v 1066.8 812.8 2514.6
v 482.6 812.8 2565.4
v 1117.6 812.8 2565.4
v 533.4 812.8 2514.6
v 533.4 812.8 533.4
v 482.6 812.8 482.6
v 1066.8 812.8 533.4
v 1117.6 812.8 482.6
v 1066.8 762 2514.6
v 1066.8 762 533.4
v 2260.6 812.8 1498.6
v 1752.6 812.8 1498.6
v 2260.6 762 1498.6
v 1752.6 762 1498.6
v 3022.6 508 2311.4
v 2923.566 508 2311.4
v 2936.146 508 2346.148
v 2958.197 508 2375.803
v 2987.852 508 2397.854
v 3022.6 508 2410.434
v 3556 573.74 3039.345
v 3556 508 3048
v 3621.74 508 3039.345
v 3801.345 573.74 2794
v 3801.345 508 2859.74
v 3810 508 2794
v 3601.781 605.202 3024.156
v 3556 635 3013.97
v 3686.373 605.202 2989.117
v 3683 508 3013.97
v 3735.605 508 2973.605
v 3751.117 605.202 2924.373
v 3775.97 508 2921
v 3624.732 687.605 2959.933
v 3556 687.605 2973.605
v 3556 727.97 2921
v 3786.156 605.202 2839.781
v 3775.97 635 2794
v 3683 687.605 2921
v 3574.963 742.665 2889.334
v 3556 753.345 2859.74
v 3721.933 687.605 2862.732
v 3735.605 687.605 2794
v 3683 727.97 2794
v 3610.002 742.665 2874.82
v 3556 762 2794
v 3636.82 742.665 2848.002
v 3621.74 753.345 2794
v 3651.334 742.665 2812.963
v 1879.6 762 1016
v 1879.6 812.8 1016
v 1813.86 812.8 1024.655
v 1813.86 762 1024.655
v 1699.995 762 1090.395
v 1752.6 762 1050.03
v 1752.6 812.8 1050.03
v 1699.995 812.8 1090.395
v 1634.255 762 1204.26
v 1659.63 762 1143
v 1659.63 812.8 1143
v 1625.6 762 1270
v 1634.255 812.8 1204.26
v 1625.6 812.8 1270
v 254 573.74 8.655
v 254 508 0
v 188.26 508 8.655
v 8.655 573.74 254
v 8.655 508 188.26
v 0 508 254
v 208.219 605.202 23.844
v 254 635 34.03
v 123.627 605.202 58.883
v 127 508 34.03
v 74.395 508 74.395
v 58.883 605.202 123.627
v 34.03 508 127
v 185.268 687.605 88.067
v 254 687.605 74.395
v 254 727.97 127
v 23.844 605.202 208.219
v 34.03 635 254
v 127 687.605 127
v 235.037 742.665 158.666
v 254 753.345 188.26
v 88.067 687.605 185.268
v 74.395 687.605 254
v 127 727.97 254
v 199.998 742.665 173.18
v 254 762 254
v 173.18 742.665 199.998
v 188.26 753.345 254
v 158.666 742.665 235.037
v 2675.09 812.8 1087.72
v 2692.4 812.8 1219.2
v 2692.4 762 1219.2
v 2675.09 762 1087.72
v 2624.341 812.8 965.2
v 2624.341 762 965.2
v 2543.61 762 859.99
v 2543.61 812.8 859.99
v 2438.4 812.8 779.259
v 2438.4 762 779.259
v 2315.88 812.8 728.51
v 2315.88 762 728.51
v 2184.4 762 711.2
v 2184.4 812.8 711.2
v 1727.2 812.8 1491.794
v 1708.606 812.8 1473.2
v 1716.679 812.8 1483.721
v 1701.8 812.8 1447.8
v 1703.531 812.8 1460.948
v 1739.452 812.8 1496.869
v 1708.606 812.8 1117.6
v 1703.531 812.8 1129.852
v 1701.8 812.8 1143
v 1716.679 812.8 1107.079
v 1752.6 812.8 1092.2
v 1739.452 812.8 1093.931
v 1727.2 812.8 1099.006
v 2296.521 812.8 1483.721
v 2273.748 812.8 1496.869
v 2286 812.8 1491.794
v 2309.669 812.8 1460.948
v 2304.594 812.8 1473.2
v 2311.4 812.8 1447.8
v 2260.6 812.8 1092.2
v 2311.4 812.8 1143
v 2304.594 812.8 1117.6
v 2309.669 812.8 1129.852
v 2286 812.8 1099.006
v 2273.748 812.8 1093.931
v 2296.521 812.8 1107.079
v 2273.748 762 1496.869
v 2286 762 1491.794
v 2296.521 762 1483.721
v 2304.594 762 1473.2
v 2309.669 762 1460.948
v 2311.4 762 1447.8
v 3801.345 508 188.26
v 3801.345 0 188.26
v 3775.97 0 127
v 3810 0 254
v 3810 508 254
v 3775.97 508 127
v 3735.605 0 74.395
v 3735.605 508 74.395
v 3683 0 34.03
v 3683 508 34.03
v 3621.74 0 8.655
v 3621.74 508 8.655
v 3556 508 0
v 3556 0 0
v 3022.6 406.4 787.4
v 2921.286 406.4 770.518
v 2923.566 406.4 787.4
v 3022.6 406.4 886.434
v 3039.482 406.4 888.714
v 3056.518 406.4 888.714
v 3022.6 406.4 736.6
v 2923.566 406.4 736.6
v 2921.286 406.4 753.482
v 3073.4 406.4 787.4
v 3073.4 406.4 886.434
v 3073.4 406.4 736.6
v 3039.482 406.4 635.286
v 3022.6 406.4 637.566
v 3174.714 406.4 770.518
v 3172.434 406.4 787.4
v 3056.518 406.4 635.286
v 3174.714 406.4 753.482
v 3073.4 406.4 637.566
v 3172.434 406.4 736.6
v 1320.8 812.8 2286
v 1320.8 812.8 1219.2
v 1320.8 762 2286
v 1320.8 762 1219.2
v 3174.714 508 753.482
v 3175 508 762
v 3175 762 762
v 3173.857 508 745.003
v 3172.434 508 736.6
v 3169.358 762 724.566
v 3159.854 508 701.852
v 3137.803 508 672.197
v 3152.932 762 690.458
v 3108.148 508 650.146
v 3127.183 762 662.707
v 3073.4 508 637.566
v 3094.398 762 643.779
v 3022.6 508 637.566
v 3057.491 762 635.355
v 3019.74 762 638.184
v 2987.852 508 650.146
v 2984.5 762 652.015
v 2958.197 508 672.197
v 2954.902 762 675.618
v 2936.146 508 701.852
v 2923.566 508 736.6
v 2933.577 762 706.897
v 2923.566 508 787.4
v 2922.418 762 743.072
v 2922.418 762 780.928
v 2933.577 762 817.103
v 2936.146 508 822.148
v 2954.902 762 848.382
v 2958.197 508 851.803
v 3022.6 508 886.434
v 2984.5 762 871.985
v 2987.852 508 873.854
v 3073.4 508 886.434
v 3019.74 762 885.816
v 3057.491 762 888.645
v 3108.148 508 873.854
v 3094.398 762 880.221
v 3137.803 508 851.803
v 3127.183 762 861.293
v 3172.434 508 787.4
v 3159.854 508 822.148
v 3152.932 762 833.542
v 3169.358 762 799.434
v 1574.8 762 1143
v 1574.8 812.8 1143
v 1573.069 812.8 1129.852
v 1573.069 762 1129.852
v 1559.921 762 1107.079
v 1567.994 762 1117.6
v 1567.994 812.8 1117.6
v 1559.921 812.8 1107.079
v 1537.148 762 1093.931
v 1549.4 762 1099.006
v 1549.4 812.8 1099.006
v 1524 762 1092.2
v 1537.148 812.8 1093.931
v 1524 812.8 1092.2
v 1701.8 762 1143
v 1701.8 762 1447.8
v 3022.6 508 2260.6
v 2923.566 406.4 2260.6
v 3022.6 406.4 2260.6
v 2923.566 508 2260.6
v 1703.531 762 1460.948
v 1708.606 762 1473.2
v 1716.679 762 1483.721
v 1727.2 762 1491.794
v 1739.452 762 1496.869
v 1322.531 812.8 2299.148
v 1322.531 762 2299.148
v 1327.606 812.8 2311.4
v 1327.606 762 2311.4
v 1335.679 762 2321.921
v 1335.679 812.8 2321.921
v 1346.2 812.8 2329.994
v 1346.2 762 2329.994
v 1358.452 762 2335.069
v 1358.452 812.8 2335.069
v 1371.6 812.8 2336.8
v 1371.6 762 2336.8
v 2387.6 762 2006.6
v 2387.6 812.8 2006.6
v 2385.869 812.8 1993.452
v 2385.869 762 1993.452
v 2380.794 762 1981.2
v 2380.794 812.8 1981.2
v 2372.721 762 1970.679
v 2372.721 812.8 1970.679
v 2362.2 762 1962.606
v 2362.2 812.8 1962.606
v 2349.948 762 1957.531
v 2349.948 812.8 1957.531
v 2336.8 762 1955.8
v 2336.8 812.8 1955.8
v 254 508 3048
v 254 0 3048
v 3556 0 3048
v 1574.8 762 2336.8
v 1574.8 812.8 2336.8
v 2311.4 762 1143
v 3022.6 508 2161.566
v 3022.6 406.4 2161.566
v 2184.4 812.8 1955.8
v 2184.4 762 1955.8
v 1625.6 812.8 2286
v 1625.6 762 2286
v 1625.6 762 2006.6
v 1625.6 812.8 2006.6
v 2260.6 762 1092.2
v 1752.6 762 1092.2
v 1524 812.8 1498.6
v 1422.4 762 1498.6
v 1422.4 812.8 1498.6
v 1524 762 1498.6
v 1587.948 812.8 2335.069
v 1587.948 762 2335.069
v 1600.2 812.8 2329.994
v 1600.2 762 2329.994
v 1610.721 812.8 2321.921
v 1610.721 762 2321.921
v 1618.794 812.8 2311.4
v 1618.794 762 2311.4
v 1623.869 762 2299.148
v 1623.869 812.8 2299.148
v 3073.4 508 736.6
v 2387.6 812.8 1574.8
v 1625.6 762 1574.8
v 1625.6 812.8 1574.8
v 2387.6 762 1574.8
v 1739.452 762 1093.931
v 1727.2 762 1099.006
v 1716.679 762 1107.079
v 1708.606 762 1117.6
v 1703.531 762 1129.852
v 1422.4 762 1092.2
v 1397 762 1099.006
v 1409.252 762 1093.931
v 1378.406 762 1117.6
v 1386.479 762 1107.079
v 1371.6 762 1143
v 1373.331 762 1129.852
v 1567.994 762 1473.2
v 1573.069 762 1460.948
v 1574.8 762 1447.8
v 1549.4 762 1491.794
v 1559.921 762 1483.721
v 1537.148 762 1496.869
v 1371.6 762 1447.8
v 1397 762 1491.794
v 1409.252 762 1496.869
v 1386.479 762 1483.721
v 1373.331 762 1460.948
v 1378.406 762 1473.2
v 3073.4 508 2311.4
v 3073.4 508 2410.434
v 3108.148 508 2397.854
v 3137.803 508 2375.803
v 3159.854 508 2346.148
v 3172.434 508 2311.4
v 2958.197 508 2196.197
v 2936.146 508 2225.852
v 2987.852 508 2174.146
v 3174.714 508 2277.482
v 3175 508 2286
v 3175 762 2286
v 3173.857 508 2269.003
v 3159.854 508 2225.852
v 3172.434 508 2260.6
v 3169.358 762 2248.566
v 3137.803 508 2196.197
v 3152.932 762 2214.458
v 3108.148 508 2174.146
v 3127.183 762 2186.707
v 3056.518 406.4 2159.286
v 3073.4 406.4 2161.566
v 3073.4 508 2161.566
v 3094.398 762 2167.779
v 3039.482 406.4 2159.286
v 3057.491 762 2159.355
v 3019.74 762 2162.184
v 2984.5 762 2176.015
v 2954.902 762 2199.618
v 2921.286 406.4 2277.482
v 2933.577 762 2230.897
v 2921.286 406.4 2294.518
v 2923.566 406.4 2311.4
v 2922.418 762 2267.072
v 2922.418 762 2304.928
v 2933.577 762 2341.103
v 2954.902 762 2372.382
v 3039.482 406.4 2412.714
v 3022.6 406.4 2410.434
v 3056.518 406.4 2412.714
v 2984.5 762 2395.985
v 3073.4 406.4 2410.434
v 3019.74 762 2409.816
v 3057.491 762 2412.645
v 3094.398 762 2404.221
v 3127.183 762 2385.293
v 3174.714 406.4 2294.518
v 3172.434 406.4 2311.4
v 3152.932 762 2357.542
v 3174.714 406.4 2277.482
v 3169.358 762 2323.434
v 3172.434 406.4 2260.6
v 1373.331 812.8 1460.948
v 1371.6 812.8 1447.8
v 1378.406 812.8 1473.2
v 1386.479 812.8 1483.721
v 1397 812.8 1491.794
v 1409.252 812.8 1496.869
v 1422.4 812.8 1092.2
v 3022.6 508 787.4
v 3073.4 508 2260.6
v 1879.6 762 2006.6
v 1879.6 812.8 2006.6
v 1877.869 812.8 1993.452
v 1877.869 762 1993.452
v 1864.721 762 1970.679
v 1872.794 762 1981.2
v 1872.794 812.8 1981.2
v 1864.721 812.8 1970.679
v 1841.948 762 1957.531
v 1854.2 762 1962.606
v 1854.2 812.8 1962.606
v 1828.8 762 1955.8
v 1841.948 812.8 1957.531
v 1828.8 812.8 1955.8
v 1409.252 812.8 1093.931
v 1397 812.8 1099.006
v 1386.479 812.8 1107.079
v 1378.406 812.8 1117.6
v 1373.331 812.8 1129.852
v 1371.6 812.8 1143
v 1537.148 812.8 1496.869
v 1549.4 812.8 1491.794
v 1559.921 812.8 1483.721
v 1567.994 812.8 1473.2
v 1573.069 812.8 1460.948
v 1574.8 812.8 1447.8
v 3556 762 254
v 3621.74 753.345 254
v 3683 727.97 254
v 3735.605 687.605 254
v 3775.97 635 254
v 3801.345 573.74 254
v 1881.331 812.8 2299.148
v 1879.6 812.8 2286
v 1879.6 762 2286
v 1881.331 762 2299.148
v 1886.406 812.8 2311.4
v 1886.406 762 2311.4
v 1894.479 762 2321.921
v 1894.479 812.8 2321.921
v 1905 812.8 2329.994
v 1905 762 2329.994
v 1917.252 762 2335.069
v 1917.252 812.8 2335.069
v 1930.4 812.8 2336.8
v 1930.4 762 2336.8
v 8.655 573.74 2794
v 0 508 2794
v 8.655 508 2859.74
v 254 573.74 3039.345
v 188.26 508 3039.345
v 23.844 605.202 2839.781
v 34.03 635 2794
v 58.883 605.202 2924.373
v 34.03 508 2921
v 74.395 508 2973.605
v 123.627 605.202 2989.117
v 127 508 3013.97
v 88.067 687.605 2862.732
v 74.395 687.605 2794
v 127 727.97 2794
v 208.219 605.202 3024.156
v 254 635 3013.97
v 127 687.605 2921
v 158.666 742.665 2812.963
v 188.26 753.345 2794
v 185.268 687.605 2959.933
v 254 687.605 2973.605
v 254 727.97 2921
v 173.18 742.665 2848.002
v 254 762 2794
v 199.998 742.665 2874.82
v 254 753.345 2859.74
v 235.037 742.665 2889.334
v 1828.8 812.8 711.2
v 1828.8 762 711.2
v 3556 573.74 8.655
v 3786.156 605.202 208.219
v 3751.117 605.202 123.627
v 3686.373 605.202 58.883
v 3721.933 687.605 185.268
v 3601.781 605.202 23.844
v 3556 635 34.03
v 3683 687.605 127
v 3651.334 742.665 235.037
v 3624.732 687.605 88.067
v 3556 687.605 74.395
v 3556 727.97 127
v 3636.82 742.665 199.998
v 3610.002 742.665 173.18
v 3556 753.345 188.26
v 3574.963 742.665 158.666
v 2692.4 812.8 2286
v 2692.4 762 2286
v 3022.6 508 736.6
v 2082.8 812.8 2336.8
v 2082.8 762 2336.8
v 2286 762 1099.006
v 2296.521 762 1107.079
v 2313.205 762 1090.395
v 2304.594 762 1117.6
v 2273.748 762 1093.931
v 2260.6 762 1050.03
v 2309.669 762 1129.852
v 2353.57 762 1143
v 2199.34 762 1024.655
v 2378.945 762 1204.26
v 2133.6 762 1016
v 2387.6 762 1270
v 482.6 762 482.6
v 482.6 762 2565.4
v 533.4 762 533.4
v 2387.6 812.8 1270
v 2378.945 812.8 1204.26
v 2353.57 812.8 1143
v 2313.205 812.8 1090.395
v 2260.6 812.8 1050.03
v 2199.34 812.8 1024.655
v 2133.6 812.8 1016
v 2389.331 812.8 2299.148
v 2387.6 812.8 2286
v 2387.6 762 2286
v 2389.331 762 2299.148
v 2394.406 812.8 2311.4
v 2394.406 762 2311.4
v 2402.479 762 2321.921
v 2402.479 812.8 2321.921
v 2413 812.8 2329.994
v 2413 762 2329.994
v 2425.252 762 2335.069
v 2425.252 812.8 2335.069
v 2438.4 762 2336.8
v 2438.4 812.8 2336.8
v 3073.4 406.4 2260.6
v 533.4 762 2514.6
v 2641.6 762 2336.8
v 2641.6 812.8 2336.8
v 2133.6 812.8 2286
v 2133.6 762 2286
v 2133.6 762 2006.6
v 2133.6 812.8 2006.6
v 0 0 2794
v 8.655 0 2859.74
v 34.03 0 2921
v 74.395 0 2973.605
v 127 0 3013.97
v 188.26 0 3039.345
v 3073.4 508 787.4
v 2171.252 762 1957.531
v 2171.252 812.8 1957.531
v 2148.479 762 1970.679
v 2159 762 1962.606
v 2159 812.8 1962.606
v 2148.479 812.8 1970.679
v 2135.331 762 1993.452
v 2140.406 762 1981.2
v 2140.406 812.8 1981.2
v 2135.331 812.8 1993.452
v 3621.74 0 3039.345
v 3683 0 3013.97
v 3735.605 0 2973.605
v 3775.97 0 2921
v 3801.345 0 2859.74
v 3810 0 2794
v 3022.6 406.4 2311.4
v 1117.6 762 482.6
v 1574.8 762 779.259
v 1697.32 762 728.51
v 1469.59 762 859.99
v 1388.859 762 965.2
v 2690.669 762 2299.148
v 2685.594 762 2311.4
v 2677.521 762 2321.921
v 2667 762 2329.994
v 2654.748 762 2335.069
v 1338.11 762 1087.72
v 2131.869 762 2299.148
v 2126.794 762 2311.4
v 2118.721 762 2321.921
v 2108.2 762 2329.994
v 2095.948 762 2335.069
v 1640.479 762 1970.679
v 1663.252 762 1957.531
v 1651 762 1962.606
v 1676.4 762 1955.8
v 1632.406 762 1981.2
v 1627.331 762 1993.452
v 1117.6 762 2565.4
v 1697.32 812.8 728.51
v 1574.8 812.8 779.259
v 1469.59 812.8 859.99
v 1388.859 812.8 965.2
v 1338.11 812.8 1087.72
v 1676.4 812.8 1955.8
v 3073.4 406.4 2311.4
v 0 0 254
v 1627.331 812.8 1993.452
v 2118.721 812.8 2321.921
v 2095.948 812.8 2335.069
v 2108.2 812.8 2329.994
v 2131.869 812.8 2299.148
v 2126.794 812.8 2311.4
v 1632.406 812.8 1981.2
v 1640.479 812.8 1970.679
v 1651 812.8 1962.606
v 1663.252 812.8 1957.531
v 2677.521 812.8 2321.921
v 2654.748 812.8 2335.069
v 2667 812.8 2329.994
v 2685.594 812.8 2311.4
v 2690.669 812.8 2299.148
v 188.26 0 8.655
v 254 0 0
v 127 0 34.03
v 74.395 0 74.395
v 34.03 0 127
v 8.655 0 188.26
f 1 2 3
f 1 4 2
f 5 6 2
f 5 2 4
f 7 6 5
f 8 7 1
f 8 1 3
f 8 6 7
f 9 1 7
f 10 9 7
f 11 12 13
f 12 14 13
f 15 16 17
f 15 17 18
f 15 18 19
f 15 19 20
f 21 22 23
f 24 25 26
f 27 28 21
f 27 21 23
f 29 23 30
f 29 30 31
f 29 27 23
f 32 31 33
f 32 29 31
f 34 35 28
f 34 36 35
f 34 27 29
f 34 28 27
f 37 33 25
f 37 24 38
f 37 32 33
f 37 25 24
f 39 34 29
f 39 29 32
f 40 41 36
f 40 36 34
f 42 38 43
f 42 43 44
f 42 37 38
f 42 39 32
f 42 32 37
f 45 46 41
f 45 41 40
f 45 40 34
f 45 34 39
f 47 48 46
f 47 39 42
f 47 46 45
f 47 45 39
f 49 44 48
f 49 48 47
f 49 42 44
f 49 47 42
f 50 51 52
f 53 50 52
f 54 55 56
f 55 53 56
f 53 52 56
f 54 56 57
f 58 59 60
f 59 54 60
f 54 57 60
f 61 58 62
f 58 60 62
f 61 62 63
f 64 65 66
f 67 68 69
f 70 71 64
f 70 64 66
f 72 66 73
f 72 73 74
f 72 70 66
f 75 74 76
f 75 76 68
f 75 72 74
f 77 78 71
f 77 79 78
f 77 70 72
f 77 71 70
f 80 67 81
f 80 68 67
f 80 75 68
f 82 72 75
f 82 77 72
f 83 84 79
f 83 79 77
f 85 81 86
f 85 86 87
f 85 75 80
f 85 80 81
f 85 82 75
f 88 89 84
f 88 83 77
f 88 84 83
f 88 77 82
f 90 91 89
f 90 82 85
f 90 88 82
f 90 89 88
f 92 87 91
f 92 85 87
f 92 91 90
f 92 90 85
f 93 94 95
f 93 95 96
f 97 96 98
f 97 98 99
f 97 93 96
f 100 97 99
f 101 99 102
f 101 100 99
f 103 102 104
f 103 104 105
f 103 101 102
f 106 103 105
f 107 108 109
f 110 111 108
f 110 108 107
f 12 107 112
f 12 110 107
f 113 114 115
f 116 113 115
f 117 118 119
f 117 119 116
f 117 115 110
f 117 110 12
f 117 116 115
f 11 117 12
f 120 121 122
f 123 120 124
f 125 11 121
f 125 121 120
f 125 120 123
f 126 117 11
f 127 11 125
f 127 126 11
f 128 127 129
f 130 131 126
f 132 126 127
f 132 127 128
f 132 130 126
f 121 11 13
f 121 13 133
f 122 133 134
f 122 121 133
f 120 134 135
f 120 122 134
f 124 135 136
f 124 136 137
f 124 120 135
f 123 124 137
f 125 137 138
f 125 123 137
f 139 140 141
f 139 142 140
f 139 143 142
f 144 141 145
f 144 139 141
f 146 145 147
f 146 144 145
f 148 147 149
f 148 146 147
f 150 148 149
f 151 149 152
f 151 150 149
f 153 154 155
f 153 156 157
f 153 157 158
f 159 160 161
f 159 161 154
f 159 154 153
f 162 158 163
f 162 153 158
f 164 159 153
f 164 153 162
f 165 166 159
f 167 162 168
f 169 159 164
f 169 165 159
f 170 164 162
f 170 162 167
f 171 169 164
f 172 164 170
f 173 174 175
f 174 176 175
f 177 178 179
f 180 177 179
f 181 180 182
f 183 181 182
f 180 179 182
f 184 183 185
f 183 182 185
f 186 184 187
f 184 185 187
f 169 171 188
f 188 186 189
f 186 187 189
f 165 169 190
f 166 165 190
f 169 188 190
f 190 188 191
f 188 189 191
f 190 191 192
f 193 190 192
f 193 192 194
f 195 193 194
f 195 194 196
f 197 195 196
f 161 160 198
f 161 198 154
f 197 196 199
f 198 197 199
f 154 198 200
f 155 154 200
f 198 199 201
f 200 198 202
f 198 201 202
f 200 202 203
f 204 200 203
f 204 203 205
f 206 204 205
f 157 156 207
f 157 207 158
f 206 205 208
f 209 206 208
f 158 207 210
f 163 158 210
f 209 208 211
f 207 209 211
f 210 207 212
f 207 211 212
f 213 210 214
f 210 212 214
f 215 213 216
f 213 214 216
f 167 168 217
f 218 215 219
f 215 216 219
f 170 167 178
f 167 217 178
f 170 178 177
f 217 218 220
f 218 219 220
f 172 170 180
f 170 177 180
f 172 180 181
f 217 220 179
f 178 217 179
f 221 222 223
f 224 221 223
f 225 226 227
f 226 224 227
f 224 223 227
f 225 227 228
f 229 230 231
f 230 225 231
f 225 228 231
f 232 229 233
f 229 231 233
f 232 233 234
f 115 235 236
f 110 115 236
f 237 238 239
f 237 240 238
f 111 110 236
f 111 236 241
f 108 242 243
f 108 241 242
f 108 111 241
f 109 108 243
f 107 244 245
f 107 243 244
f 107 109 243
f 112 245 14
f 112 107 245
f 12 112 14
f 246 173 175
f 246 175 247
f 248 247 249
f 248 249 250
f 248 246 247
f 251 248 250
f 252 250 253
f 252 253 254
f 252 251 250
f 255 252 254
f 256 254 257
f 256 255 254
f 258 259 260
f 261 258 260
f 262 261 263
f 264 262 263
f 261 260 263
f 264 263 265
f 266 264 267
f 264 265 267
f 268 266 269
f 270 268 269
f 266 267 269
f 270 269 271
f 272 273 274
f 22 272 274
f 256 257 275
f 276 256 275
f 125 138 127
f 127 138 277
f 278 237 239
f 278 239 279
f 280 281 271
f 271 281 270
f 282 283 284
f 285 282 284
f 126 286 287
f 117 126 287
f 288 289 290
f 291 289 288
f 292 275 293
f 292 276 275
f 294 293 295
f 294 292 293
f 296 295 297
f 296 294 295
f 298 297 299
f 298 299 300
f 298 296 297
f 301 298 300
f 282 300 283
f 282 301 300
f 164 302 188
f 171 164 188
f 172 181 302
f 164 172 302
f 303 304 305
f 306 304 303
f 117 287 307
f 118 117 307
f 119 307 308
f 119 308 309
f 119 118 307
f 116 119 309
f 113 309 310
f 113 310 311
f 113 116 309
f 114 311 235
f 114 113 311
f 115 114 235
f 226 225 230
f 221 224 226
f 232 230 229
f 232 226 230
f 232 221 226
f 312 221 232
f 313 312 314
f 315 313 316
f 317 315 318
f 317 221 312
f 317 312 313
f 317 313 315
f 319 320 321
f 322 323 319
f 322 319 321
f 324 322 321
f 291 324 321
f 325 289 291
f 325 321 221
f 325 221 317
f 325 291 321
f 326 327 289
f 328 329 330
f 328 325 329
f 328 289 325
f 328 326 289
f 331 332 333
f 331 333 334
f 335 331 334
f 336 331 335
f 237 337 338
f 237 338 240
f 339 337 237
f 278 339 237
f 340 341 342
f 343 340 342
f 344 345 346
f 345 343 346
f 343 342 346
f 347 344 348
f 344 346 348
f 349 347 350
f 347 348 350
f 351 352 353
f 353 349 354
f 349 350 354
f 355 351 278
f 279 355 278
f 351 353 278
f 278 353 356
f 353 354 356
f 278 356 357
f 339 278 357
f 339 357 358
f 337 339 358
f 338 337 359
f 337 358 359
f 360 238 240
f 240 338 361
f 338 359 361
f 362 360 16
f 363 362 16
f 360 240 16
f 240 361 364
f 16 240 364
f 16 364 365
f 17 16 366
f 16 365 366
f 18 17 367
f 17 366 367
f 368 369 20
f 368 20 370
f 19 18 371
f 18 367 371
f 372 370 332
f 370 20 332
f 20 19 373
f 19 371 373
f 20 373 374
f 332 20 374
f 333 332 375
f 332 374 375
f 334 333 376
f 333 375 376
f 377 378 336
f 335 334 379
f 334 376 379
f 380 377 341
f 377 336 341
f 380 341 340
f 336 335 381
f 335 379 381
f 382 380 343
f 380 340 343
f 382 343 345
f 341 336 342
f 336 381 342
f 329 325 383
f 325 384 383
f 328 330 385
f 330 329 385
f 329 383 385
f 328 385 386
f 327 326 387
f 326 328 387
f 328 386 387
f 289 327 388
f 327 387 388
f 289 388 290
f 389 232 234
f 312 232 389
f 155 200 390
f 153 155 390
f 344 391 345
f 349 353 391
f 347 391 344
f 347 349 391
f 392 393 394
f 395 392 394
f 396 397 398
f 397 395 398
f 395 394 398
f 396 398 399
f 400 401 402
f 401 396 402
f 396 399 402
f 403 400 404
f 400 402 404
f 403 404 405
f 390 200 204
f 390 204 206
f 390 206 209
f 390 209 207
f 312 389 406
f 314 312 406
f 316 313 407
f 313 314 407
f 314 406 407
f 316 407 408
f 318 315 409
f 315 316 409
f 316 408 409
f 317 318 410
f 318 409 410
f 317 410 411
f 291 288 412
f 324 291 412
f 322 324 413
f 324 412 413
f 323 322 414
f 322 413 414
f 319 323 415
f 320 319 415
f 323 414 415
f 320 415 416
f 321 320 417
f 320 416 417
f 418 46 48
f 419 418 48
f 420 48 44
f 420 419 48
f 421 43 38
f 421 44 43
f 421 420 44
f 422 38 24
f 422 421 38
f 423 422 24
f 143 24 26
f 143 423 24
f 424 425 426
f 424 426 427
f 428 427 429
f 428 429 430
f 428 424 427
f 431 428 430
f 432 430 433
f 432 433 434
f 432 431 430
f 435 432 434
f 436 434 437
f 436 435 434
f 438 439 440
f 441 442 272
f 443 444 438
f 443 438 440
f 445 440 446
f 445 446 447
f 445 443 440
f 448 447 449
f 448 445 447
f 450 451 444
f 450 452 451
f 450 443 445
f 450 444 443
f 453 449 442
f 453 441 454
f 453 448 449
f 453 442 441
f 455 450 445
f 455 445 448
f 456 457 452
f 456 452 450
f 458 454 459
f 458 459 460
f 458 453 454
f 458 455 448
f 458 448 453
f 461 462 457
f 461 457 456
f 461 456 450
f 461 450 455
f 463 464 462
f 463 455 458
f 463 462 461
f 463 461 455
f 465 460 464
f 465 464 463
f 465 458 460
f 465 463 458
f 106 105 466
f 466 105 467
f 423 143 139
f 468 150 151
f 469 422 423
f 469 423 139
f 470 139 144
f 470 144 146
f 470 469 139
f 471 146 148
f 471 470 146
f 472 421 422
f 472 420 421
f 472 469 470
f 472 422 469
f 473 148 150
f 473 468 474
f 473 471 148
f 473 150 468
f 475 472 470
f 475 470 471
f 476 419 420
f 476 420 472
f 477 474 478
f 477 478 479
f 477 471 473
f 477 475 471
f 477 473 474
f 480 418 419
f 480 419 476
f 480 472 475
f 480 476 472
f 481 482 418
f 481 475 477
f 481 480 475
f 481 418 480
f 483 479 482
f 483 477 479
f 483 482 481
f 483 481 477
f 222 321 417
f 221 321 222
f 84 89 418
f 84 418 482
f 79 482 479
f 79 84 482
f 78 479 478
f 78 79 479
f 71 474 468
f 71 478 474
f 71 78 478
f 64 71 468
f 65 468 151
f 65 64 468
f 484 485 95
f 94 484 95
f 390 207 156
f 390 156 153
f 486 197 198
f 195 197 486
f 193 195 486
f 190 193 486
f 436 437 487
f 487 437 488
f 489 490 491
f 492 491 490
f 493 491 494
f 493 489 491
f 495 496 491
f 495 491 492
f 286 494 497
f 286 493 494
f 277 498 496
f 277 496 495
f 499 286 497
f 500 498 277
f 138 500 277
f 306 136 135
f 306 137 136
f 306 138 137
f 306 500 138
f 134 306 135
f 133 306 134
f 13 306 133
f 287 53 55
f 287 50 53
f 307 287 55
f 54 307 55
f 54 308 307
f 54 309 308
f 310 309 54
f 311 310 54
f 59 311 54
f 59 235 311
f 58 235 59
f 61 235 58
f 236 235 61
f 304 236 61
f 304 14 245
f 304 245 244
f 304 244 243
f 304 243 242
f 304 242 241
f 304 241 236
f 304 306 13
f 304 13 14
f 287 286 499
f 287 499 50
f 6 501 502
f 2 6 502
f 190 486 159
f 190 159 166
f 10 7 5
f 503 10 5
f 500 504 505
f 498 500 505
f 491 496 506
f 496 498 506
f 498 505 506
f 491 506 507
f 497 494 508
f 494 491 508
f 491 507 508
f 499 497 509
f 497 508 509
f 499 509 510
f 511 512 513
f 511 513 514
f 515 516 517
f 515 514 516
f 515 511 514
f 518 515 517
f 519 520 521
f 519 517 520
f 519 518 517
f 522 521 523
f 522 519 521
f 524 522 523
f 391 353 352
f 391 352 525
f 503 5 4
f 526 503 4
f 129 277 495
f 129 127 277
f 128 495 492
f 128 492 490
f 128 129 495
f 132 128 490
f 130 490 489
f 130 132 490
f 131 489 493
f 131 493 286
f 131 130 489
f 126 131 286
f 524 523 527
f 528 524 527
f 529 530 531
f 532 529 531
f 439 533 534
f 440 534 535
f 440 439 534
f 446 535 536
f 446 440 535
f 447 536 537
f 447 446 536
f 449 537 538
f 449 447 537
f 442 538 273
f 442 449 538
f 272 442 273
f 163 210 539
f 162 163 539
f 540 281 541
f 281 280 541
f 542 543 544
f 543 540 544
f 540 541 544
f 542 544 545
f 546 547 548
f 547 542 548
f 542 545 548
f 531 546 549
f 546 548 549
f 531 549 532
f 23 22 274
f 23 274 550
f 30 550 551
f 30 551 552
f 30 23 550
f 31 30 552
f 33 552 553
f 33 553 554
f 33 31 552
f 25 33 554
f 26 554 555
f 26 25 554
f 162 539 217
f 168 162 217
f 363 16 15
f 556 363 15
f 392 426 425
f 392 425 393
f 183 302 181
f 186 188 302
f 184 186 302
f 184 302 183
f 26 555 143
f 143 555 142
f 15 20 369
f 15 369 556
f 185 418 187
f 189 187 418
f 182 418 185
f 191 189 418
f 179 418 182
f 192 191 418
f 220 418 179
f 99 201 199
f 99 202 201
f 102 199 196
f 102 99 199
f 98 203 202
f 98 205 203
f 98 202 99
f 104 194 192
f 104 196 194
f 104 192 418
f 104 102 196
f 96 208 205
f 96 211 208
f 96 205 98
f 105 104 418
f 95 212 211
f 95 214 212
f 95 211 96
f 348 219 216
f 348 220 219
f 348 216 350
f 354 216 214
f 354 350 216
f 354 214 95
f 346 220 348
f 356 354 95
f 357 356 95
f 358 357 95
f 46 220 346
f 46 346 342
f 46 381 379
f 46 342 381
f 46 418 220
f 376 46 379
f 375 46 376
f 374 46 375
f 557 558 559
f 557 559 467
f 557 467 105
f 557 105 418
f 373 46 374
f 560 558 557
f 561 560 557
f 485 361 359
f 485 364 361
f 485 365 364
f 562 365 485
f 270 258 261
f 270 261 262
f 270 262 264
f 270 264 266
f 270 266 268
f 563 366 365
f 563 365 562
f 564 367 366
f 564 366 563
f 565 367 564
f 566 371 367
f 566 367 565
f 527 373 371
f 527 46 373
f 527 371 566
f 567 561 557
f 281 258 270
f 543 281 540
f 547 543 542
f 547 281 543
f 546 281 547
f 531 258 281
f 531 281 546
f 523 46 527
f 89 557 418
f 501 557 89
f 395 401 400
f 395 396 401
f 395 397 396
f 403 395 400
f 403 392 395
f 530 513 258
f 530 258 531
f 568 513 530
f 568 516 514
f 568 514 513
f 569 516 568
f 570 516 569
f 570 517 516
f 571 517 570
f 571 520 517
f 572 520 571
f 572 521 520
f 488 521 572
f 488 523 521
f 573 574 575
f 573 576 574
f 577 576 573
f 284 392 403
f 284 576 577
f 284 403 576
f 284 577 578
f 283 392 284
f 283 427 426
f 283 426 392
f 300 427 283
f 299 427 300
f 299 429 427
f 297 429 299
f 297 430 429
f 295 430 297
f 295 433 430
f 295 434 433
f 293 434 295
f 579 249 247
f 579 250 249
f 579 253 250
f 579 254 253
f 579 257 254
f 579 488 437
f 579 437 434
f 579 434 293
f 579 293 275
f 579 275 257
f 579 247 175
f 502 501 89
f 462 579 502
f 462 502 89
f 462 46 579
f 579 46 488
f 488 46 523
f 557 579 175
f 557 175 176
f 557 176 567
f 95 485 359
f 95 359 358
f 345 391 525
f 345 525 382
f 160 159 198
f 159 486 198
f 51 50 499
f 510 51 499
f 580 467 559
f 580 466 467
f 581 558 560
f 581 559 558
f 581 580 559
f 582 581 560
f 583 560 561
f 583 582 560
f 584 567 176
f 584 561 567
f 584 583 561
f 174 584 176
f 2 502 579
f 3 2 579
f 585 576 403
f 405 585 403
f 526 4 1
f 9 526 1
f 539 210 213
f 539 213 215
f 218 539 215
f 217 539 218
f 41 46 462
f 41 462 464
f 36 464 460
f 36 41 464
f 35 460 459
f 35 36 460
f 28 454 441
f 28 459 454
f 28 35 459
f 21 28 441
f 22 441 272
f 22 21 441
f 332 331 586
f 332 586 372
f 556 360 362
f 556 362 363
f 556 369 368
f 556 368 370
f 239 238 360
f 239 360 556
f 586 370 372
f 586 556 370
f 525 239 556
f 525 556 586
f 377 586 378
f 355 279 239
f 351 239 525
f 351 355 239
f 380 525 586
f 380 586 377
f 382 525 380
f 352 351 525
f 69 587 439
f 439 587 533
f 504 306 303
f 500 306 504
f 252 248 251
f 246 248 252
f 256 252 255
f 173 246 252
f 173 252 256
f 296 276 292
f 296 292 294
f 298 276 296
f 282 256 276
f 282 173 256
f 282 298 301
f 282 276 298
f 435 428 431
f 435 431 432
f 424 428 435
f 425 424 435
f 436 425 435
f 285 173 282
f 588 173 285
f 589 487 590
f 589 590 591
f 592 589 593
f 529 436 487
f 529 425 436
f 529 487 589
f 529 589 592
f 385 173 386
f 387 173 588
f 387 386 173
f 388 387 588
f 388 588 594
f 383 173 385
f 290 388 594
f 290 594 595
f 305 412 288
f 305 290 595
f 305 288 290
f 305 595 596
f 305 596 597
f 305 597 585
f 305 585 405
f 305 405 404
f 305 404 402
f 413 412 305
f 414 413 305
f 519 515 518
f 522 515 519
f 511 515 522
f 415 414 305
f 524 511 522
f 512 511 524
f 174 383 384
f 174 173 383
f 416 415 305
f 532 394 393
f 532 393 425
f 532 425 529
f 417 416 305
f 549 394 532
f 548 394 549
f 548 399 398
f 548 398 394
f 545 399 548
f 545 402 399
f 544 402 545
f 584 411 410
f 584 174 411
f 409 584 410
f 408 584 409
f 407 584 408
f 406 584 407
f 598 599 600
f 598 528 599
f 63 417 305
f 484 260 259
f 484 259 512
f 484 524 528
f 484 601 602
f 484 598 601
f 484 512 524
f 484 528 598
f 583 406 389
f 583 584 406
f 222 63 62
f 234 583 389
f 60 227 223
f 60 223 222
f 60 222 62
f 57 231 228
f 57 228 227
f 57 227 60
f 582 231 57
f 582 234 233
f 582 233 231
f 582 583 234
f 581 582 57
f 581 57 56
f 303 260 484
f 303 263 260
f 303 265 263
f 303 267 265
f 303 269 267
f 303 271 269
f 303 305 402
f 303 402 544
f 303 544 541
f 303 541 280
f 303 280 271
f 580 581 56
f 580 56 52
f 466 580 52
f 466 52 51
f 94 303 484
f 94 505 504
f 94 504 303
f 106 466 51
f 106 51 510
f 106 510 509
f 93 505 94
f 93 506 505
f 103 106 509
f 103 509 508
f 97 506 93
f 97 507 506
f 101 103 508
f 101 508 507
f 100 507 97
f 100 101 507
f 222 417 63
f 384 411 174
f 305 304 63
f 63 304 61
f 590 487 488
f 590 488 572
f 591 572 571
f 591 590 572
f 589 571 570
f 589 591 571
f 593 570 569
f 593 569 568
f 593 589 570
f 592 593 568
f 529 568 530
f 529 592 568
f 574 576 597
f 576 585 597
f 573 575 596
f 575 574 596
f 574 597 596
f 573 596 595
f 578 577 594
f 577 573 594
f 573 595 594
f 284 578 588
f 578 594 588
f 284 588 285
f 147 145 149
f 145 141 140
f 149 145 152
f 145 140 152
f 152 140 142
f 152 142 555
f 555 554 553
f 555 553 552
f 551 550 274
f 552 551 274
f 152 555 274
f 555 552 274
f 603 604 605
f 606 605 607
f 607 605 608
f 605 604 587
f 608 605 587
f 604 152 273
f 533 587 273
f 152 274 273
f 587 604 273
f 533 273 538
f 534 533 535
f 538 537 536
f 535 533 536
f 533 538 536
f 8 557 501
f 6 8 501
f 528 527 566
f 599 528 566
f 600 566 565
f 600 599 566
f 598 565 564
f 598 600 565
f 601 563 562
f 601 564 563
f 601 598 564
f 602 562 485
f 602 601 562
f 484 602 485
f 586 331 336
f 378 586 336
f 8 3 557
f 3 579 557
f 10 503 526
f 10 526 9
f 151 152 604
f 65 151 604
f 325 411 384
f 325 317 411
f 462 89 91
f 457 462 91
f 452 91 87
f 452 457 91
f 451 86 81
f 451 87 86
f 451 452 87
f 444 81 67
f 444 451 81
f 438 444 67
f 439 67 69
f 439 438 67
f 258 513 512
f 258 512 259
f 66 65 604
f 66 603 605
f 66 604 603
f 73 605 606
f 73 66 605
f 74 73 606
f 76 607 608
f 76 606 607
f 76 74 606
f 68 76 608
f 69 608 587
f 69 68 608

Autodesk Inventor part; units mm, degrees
ref_plane "YZ Plane" through (0, 0, 0) normal (1, 0, 0) x (0, 1, 0)
ref_plane "XZ Plane" through (0, 0, 0) normal (0, 1, 0) x (-1, 0, 0)
ref_plane "XY Plane" through (0, 0, 0) normal (0, 0, 1) x (1, 0, 0)
sketch "Sketch1" plane through (0, 0, 0) normal (0, 1, 0) x (-1, 0, 0)
  line L0 (0, 3048) -> (-3810, 3048)
  line L1 (-3810, 3048) -> (-3810, 0)
  line L2 (-3810, 0) -> (0, 0)
  line L3 (0, 0) -> (0, 3048)
  dimension "d0" = 3810
  dimension "d1" = 3048
extrude "Extrusion1" add sketch "Sketch1" along normal blind 762
sketch "Sketch2" plane through (0, 762, 0) normal (0, 1, 0) x (1, 0, 0)
  line L0 (482.6, -2565.4) -> (1117.6, -2565.4)
  line L1 (1117.6, -2565.4) -> (1117.6, -482.6)
  line L2 (1117.6, -482.6) -> (482.6, -482.6)
  line L3 (482.6, -482.6) -> (482.6, -2565.4)
  line L4 (0, -3048) -> (3810, -3048) projected
  line L5 (0, 0) -> (0, -3048) projected
  dimension "d5" = 2082.8
  dimension "d6" = 482.6
  dimension "d7" = 482.6
  dimension "d8" = 635
extrude "Extrusion2" add sketch "Sketch2" along normal blind 50.8
sketch "Sketch3" plane through (0, 812.8, 0) normal (0, 1, 0) x (1, 0, 0)
  point P0 (0, 0)
sketch "Sketch4" plane through (0, 812.8, 0) normal (0, 1, 0) x (1, 0, 0)
  line L0 (533.4, -2514.6) -> (1066.8, -2514.6)
  line L1 (1066.8, -2514.6) -> (1066.8, -533.4)
  line L2 (1066.8, -533.4) -> (533.4, -533.4)
  line L3 (533.4, -533.4) -> (533.4, -2514.6)
  line L4 (482.6, -482.6) -> (482.6, -2565.4) projected
  line L5 (482.6, -2565.4) -> (1117.6, -2565.4) projected
  line L6 (1117.6, -2565.4) -> (1117.6, -482.6) projected
  line L7 (1117.6, -482.6) -> (482.6, -482.6) projected
  point P0 (0, 0)
  dimension "d11" = 50.8
  dimension "d12" = 50.8
  dimension "d13" = 50.8
  dimension "d14" = 50.8
extrude "Extrusion3" cut sketch "Sketch4" against normal blind 50.8 contours L3 L2 L1 L0
fillet "Fillet1" radius 254 4 edges at (0, 381, 3048) (3810, 381, 3048) (3810, 381, 0) (0, 381, 0)
fillet "Fillet2" radius 254 8 edges at (0, 762, 1524) (74.3949, 762, 2973.6051) (1905, 762, 3048) (3735.6051, 762, 2973.6051) (3810, 762, 1524) (3735.6051, 762, 74.3949) (1905, 762, 0) (74.3949, 762, 74.3949)
sketch "Sketch5" plane through (0, 762, 0) normal (0, 1, 0) x (1, 0, 0)
  circle A0 centre (3048, -2286) radius 127
  circle A1 centre (3048, -762) radius 127
  line L0 (3556, -254) -> (3556, -2794) projected
  line L1 (254, -254) -> (3556, -254) projected
  line L2 (3556, -2794) -> (254, -2794) projected
  point P0 (0, 0)
  dimension "d19" = 254
  dimension "d20" = 508
  dimension "d21" = 508
  dimension "d22" = 508
extrude "Extrusion4" cut sketch "Sketch5" against normal blind 254
sketch "Sketch6" plane through (3048, 508, 2286) normal (0, 1, 0) x (1, 0, 0)
  circle A0 centre (0, 0) radius 127 projected
  circle A1 centre (0, 1524) radius 127 projected
  line L0 (-124.4341, 25.4) -> (124.4341, 25.4)
  line L1 (-124.4341, -25.4) -> (124.4341, -25.4)
  line L2 (-25.4, -124.4341) -> (-25.4, 124.4341)
  line L3 (25.4, 124.4341) -> (25.4, -124.4341)
  circle A2 centre (0, 0) radius 127 projected
  line L4 (-124.4341, 1498.6) -> (124.4341, 1498.6)
  line L5 (124.4341, 1549.4) -> (-124.4341, 1549.4)
  line L6 (25.4, 1399.5659) -> (25.4, 1648.4341)
  line L7 (-25.4, 1399.5659) -> (-25.4, 1648.4341)
  point P0 (-3048, 2286)
  point P1 (-25.4, 1498.6)
  point P2 (25.4, 1498.6)
  point P3 (25.4, 1549.4)
  point P4 (-25.4, 1549.4)
  point P5 (25.4, -25.4)
  point P6 (25.4, 25.4)
  point P7 (-25.4, 25.4)
  point P8 (-25.4, -25.4)
  dimension "d25" = 50.8
  dimension "d26" = 50.8
  dimension "d27" = 25.4
  dimension "d28" = 25.4
  dimension "d29" = 25.4
  dimension "d30" = 25.4
  dimension "d31" = 50.8
  dimension "d32" = 50.8
extrude "Extrusion5" cut sketch "Sketch6" against normal blind 101.6 contours A0 L1 L3 L0 | L3 L0 L2 A0 | L3 L1 L2 L0 | A0 L2 L1 L3 | L2 L1 A0 L0 | A1 L4 L6 L5 | L6 L5 L7 A1 | L6 L4 L7 L5 | A1 L7 L4 L6 | L7 L4 A1 L5
sketch "Sketch7" plane through (0, 762, 0) normal (0, 1, 0) x (1, 0, 0)
  circle A0 centre (3048, -2286) radius 127 projected
  circle A1 centre (3048, -762) radius 127 projected
  point P0 (0, 0)
sketch "Sketch9" plane through (0, 762, 0) normal (0, 1, 0) x (1, 0, 0)
  line L0 (1320.8, -2336.8) -> (2692.4, -2336.8)
  line L1 (2692.4, -2336.8) -> (2692.4, -711.2)
  line L2 (2692.4, -711.2) -> (1320.8, -711.2)
  line L3 (1320.8, -711.2) -> (1320.8, -2336.8)
  line L4 (254, -3048) -> (3556, -3048) projected
  line L5 (1117.6, -2565.4) -> (1117.6, -482.6) projected
  line L6 (1625.6, -2336.8) -> (1625.6, -711.2)
  line L7 (2133.6, -2336.8) -> (2133.6, -711.2)
  line L8 (1879.6, -2336.8) -> (1879.6, -711.2)
  line L9 (2387.6, -2336.8) -> (2387.6, -711.2)
  line L10 (1625.6, -1955.8) -> (1879.6, -1955.8)
  line L11 (2133.6, -1955.8) -> (2387.6, -1955.8)
  line L12 (1625.6, -1016) -> (2387.6, -1016)
  line L13 (1625.6, -1574.8) -> (2387.6, -1574.8)
  line L14 (1701.8, -1498.6) -> (2311.4, -1498.6)
  line L15 (2311.4, -1498.6) -> (2311.4, -1092.2)
  line L16 (2311.4, -1092.2) -> (1701.8, -1092.2)
  line L17 (1701.8, -1092.2) -> (1701.8, -1498.6)
  line L18 (1371.6, -1498.6) -> (1574.8, -1498.6)
  line L19 (1574.8, -1498.6) -> (1574.8, -1092.2)
  line L20 (1574.8, -1092.2) -> (1371.6, -1092.2)
  line L21 (1371.6, -1092.2) -> (1371.6, -1498.6)
  point P0 (0, 0)
  point P1 (2260.6, -1955.8)
  dimension "d35" = 1625.6
  dimension "d36" = 1371.6
  dimension "d37" = 711.2
  dimension "d38" = 203.2
  dimension "d39" = 304.8
  dimension "d40" = 304.8
  dimension "d41" = 254
  dimension "d42" = 254
  dimension "d43" = 381
  dimension "d44" = 381
  dimension "d45" = 304.8
  dimension "d46" = 381
  dimension "d47" = 76.2
  dimension "d48" = 76.2
  dimension "d49" = 76.2
  dimension "d50" = 76.2
  dimension "d51" = 50.8
  dimension "d52" = 50.8
extrude "Extrusion6" add sketch "Sketch9" along normal blind 50.8 contours L3 L2 L6 L0 | L8 L13 L7 L0 | L6 L13 L8 L10 | L2 L8 L12 L6 | L2 L7 L12 L8 | L9 L2 L1 L0 | L7 L13 L9 L11 | L2 L9 L12 L7 | L14 L17 L16 L8 | L8 L16 L7 L14 | L7 L16 L15 L14
fillet "Fillet3" radius 508 2 edges at (2692.4, 787.4, 711.2) (1320.8, 787.4, 711.2)
fillet "Fillet4" radius 254 2 edges at (2387.6, 787.4, 1016) (1625.6, 787.4, 1016)
fillet "Fillet5" radius 50.8 18 edges at (1701.8, 787.4, 1092.2) (2311.4, 787.4, 1092.2) (2311.4, 787.4, 1498.6) (1701.8, 787.4, 1498.6) (1625.6, 787.4, 1955.8) (1879.6, 787.4, 1955.8) (1879.6, 787.4, 2336.8) (1320.8, 787.4, 2336.8) (1625.6, 787.4, 2336.8) (2133.6, 787.4, 2336.8) (2133.6, 787.4, 1955.8) (2387.6, 787.4, 1955.8) (2387.6, 787.4, 2336.8) (2692.4, 787.4, 2336.8) (1574.8, 787.4, 1092.2) (1371.6, 787.4, 1092.2) (1371.6, 787.4, 1498.6) (1574.8, 787.4, 1498.6)
sketch "Sketch10" plane through (254, 0, 3048) normal (0, 0, 1) x (1, 0, 0)
  point P0 (-254, 0)
equation "\"BendRadius\" = Thickness"
equation "\"BendReliefWidth\" = Thickness"
equation "\"BendReliefDepth\" = 0.5 * Thickness"
equation "\"CornerReliefSize\" = 4 * Thickness"
equation "\"MinimumRemnant\" = 2 * Thickness"
equation "\"TransitionRadius\" = BendRadius"
equation "\"JacobiRadiusSize\" = Thickness"
equation "\"GapSize\" = Thickness"
equation "\"Thickness\" = 3.048"
